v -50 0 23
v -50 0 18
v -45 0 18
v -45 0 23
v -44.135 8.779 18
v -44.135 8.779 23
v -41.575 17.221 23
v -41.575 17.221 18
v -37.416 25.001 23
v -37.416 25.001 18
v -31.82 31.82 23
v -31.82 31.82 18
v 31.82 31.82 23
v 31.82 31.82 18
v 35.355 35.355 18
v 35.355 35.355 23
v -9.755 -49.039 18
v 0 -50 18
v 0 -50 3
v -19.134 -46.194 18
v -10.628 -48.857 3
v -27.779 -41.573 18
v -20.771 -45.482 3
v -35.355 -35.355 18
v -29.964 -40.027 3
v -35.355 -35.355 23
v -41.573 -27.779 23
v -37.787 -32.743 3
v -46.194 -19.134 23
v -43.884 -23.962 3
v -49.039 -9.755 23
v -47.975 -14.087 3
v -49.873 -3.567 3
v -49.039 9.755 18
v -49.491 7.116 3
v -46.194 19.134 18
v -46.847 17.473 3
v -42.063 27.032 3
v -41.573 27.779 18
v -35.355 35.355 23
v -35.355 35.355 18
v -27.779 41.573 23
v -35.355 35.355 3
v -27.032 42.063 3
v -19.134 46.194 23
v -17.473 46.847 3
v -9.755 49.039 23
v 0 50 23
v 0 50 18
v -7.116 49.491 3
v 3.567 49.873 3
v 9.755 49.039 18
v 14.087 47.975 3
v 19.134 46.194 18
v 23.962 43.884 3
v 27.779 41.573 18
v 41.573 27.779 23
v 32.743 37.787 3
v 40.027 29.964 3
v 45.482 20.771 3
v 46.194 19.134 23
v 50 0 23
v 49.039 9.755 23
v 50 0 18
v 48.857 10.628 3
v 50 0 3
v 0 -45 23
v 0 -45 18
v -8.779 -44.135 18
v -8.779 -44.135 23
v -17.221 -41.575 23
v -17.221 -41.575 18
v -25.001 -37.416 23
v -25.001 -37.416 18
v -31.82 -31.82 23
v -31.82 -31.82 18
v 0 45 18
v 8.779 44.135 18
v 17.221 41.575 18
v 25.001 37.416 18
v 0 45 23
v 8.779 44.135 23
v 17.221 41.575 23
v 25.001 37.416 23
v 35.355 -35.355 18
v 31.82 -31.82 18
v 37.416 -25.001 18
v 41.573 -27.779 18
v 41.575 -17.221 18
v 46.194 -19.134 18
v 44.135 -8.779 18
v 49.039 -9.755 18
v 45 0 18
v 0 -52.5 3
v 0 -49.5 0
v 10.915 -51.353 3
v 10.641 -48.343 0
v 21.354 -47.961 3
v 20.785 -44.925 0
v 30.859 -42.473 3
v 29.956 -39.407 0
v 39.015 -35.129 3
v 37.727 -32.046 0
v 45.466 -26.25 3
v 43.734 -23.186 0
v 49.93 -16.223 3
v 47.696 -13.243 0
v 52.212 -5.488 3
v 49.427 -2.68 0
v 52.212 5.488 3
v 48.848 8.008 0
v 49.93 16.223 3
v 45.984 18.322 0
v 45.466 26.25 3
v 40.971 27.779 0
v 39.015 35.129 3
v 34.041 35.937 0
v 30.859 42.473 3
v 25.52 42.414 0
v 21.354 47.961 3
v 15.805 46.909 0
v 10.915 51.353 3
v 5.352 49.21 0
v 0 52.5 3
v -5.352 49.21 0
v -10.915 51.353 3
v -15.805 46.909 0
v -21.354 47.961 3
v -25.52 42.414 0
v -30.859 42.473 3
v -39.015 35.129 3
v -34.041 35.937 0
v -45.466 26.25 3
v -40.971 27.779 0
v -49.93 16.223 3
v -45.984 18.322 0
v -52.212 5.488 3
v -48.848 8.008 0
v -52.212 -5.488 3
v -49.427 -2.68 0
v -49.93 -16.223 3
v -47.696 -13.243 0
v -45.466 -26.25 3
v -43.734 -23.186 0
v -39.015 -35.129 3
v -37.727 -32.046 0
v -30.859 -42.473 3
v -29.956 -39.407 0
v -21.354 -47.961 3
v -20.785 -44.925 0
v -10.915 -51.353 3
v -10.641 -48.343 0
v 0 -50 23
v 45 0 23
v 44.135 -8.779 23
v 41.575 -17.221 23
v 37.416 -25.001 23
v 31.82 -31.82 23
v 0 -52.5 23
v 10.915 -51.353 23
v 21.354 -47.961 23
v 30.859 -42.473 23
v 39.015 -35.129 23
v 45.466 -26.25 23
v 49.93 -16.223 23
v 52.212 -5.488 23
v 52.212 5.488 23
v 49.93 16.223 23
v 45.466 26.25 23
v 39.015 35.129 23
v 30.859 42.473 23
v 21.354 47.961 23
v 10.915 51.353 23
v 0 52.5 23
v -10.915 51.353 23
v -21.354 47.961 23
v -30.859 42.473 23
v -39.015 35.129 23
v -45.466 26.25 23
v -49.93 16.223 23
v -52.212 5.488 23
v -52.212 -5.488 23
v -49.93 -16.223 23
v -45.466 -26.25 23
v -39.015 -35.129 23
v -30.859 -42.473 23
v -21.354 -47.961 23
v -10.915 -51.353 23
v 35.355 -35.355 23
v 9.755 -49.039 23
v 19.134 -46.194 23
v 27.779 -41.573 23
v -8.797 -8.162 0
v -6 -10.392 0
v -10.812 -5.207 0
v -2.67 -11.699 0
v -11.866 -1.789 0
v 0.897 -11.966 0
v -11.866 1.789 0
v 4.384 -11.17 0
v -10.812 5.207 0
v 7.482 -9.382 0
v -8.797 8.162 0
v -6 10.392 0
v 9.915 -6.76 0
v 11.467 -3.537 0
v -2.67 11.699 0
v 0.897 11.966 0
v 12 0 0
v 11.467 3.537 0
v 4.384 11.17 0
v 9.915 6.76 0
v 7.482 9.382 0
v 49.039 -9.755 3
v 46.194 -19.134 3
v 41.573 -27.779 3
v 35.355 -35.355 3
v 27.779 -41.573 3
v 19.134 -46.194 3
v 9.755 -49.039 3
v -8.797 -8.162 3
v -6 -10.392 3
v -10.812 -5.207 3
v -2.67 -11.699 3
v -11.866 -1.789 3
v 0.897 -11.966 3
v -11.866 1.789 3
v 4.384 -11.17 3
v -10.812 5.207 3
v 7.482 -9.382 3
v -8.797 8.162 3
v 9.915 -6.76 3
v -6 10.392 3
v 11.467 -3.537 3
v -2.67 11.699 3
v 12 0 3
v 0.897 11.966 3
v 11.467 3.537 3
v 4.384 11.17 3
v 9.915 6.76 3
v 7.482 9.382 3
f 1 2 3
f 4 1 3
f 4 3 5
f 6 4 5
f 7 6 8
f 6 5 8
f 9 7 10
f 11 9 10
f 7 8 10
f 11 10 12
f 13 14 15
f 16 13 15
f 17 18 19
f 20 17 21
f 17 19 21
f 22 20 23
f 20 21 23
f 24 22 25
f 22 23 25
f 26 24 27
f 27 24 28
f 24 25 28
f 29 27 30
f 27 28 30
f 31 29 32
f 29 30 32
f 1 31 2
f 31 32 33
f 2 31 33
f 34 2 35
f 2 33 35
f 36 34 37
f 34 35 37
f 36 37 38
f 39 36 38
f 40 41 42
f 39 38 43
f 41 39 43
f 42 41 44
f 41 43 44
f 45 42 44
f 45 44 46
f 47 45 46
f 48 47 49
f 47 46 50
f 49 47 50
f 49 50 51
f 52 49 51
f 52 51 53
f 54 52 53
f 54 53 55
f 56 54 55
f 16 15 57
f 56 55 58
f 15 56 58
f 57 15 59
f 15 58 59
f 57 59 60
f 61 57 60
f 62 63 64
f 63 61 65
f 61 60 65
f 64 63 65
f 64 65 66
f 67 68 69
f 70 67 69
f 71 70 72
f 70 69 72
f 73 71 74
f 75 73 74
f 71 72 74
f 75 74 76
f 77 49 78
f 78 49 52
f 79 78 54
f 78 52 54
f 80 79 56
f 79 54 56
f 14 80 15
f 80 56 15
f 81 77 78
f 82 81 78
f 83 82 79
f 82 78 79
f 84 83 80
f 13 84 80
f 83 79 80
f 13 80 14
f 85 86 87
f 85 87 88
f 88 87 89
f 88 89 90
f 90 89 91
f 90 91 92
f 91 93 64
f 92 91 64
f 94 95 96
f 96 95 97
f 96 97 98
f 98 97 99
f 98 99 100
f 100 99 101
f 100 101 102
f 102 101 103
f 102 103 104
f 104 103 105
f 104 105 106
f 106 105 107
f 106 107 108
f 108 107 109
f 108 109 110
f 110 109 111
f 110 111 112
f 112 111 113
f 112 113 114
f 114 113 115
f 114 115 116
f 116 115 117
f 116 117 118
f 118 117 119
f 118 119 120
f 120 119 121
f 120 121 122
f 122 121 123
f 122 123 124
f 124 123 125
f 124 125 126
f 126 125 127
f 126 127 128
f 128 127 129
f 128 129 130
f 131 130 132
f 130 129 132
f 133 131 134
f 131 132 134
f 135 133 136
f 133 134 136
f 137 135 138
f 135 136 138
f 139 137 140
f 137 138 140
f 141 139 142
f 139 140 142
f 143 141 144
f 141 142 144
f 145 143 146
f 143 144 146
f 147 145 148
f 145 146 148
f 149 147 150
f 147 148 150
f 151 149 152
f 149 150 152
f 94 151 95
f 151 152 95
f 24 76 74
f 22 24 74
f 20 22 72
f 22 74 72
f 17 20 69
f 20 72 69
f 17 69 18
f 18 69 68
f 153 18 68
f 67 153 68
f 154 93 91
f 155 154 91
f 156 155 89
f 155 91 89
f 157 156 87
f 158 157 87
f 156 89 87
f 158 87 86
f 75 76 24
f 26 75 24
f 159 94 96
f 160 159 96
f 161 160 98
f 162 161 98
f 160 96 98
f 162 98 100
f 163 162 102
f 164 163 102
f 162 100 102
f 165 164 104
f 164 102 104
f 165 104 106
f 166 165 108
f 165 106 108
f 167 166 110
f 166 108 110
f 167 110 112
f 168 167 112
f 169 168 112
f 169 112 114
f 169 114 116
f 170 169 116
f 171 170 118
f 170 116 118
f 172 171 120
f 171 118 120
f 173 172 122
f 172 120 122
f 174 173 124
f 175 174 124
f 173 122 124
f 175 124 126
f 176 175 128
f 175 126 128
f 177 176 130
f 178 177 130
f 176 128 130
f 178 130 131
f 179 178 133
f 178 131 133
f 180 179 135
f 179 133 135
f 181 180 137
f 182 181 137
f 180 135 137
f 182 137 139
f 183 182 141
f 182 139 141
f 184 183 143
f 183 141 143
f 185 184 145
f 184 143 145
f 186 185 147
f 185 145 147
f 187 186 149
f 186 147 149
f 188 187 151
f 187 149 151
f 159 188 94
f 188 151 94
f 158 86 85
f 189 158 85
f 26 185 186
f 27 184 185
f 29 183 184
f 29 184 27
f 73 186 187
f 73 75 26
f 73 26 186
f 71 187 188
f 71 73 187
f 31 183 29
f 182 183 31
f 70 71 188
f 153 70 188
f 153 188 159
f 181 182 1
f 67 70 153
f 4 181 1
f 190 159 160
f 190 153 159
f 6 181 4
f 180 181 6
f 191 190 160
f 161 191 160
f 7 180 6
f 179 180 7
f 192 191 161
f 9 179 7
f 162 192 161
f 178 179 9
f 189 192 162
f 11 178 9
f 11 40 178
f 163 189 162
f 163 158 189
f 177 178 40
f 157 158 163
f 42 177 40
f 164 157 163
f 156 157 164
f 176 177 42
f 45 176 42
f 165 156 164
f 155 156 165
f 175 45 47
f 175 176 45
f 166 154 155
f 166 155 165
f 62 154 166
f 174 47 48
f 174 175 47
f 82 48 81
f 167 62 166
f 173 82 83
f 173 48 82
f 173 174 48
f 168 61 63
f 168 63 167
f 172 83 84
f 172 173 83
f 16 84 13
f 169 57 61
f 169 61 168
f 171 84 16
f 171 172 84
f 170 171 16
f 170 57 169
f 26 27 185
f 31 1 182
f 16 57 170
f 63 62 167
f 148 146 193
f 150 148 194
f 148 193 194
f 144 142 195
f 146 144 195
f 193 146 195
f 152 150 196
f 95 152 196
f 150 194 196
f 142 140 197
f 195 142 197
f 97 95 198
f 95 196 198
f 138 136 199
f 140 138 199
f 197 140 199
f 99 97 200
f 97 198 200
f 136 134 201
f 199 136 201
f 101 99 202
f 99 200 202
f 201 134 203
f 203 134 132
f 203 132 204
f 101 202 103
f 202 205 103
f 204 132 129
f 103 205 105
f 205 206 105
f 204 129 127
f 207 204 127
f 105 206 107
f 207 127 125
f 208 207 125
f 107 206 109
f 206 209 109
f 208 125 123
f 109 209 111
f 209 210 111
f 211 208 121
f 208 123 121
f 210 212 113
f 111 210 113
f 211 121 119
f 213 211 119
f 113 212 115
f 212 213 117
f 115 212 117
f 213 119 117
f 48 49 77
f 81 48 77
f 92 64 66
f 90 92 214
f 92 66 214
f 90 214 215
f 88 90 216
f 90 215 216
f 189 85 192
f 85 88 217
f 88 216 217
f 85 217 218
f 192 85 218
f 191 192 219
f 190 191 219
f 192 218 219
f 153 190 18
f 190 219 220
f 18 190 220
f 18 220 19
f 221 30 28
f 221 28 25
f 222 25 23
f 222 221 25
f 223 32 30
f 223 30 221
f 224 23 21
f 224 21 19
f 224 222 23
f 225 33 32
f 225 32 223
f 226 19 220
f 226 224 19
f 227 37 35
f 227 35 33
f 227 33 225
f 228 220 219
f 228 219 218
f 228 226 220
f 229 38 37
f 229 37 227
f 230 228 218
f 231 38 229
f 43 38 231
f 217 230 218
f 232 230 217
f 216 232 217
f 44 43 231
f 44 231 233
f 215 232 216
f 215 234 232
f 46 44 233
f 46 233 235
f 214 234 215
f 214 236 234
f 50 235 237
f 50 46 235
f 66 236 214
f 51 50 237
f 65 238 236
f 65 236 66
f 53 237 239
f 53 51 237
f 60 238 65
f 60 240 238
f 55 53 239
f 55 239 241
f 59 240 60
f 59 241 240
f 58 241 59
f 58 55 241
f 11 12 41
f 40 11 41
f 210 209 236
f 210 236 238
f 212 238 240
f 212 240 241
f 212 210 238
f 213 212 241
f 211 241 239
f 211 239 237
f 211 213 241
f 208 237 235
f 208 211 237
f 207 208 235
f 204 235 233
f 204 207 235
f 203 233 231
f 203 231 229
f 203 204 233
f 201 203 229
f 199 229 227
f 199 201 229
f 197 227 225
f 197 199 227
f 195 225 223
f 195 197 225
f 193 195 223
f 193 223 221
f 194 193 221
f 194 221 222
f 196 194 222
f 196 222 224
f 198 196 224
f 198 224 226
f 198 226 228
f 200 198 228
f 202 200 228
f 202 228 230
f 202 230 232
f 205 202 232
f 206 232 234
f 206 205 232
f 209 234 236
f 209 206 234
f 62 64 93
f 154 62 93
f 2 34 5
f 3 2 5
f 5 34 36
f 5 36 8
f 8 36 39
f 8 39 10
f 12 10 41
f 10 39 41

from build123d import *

# Parameters (mm, degrees)
F0_R     = 12
F1_DEPTH = 3
F2_DEPTH = 23
F4_START = 18
F4_DEPTH = 5
F5_SIZE  = 3


with BuildPart() as f1:
    # F0 (on Top) → F1 (new body)
    with BuildSketch(Plane.XY):
        with BuildLine():
            ThreePointArc((0, -50), (35.3553390593, -35.3553390593), (50, 0))
            ThreePointArc((50, 0), (-35.3553390593, 35.3553390593), (0, -50))
        make_face()
        Circle(F0_R, mode=Mode.SUBTRACT)
    extrude(amount=F1_DEPTH)

    # F0 (on Top) → F2 (join)
    with BuildSketch(Plane.XY):
        with BuildLine():
            ThreePointArc((52.5, 0), (-37.1231060123, 37.1231060123), (0, -52.5))
            ThreePointArc((0, -52.5), (37.1231060123, -37.1231060123), (52.5, 0))
        make_face()
        with BuildLine():
            ThreePointArc((0, -50), (-35.3553390593, 35.3553390593), (50, 0))
            ThreePointArc((50, 0), (35.3553390593, -35.3553390593), (0, -50))
        make_face(mode=Mode.SUBTRACT)
    extrude(amount=F2_DEPTH)

    # F3 (on Top) → F4 (join)
    with BuildSketch(Plane.XY.offset(F4_START)):
        with BuildLine():
            Line((31.8198051534, -31.8198051534), (35.3553390593, -35.3553390593))
            ThreePointArc((35.3553390593, -35.3553390593), (46.1939766256, -19.1341716183), (50, 0))
            Line((50, 0), (45, 0))
            ThreePointArc((45, 0), (41.574578963, -17.2207544564), (31.8198051534, -31.8198051534))
        make_face()
        with BuildLine():
            ThreePointArc((-45, 0), (-41.574578963, 17.2207544564), (-31.8198051534, 31.8198051534))
            Line((-31.8198051534, 31.8198051534), (-35.3553390593, 35.3553390593))
            ThreePointArc((-35.3553390593, 35.3553390593), (-46.1939766256, 19.1341716183), (-50, 0))
            Line((-50, 0), (-45, 0))
        make_face()
        with BuildLine():
            ThreePointArc((35.3553390593, 35.3553390593), (19.1341716183, 46.1939766256), (0, 50))
            Line((0, 50), (0, 45))
            ThreePointArc((0, 45), (17.2207544564, 41.574578963), (31.8198051534, 31.8198051534))
            Line((31.8198051534, 31.8198051534), (35.3553390593, 35.3553390593))
        make_face()
        with BuildLine():
            Line((-31.8198051534, -31.8198051534), (-35.3553390593, -35.3553390593))
            ThreePointArc((-35.3553390593, -35.3553390593), (-19.1341716183, -46.1939766256), (0, -50))
            Line((0, -50), (0, -45))
            ThreePointArc((0, -45), (-17.2207544564, -41.574578963), (-31.8198051534, -31.8198051534))
        make_face()
    extrude(amount=F4_DEPTH)

    # F5
    f5_edges = [f1.edges().sort_by_distance(p)[0] for p in [
        (0, 52.5, 0),
    ]]
    chamfer(f5_edges, length=F5_SIZE)


solid = f1.part
